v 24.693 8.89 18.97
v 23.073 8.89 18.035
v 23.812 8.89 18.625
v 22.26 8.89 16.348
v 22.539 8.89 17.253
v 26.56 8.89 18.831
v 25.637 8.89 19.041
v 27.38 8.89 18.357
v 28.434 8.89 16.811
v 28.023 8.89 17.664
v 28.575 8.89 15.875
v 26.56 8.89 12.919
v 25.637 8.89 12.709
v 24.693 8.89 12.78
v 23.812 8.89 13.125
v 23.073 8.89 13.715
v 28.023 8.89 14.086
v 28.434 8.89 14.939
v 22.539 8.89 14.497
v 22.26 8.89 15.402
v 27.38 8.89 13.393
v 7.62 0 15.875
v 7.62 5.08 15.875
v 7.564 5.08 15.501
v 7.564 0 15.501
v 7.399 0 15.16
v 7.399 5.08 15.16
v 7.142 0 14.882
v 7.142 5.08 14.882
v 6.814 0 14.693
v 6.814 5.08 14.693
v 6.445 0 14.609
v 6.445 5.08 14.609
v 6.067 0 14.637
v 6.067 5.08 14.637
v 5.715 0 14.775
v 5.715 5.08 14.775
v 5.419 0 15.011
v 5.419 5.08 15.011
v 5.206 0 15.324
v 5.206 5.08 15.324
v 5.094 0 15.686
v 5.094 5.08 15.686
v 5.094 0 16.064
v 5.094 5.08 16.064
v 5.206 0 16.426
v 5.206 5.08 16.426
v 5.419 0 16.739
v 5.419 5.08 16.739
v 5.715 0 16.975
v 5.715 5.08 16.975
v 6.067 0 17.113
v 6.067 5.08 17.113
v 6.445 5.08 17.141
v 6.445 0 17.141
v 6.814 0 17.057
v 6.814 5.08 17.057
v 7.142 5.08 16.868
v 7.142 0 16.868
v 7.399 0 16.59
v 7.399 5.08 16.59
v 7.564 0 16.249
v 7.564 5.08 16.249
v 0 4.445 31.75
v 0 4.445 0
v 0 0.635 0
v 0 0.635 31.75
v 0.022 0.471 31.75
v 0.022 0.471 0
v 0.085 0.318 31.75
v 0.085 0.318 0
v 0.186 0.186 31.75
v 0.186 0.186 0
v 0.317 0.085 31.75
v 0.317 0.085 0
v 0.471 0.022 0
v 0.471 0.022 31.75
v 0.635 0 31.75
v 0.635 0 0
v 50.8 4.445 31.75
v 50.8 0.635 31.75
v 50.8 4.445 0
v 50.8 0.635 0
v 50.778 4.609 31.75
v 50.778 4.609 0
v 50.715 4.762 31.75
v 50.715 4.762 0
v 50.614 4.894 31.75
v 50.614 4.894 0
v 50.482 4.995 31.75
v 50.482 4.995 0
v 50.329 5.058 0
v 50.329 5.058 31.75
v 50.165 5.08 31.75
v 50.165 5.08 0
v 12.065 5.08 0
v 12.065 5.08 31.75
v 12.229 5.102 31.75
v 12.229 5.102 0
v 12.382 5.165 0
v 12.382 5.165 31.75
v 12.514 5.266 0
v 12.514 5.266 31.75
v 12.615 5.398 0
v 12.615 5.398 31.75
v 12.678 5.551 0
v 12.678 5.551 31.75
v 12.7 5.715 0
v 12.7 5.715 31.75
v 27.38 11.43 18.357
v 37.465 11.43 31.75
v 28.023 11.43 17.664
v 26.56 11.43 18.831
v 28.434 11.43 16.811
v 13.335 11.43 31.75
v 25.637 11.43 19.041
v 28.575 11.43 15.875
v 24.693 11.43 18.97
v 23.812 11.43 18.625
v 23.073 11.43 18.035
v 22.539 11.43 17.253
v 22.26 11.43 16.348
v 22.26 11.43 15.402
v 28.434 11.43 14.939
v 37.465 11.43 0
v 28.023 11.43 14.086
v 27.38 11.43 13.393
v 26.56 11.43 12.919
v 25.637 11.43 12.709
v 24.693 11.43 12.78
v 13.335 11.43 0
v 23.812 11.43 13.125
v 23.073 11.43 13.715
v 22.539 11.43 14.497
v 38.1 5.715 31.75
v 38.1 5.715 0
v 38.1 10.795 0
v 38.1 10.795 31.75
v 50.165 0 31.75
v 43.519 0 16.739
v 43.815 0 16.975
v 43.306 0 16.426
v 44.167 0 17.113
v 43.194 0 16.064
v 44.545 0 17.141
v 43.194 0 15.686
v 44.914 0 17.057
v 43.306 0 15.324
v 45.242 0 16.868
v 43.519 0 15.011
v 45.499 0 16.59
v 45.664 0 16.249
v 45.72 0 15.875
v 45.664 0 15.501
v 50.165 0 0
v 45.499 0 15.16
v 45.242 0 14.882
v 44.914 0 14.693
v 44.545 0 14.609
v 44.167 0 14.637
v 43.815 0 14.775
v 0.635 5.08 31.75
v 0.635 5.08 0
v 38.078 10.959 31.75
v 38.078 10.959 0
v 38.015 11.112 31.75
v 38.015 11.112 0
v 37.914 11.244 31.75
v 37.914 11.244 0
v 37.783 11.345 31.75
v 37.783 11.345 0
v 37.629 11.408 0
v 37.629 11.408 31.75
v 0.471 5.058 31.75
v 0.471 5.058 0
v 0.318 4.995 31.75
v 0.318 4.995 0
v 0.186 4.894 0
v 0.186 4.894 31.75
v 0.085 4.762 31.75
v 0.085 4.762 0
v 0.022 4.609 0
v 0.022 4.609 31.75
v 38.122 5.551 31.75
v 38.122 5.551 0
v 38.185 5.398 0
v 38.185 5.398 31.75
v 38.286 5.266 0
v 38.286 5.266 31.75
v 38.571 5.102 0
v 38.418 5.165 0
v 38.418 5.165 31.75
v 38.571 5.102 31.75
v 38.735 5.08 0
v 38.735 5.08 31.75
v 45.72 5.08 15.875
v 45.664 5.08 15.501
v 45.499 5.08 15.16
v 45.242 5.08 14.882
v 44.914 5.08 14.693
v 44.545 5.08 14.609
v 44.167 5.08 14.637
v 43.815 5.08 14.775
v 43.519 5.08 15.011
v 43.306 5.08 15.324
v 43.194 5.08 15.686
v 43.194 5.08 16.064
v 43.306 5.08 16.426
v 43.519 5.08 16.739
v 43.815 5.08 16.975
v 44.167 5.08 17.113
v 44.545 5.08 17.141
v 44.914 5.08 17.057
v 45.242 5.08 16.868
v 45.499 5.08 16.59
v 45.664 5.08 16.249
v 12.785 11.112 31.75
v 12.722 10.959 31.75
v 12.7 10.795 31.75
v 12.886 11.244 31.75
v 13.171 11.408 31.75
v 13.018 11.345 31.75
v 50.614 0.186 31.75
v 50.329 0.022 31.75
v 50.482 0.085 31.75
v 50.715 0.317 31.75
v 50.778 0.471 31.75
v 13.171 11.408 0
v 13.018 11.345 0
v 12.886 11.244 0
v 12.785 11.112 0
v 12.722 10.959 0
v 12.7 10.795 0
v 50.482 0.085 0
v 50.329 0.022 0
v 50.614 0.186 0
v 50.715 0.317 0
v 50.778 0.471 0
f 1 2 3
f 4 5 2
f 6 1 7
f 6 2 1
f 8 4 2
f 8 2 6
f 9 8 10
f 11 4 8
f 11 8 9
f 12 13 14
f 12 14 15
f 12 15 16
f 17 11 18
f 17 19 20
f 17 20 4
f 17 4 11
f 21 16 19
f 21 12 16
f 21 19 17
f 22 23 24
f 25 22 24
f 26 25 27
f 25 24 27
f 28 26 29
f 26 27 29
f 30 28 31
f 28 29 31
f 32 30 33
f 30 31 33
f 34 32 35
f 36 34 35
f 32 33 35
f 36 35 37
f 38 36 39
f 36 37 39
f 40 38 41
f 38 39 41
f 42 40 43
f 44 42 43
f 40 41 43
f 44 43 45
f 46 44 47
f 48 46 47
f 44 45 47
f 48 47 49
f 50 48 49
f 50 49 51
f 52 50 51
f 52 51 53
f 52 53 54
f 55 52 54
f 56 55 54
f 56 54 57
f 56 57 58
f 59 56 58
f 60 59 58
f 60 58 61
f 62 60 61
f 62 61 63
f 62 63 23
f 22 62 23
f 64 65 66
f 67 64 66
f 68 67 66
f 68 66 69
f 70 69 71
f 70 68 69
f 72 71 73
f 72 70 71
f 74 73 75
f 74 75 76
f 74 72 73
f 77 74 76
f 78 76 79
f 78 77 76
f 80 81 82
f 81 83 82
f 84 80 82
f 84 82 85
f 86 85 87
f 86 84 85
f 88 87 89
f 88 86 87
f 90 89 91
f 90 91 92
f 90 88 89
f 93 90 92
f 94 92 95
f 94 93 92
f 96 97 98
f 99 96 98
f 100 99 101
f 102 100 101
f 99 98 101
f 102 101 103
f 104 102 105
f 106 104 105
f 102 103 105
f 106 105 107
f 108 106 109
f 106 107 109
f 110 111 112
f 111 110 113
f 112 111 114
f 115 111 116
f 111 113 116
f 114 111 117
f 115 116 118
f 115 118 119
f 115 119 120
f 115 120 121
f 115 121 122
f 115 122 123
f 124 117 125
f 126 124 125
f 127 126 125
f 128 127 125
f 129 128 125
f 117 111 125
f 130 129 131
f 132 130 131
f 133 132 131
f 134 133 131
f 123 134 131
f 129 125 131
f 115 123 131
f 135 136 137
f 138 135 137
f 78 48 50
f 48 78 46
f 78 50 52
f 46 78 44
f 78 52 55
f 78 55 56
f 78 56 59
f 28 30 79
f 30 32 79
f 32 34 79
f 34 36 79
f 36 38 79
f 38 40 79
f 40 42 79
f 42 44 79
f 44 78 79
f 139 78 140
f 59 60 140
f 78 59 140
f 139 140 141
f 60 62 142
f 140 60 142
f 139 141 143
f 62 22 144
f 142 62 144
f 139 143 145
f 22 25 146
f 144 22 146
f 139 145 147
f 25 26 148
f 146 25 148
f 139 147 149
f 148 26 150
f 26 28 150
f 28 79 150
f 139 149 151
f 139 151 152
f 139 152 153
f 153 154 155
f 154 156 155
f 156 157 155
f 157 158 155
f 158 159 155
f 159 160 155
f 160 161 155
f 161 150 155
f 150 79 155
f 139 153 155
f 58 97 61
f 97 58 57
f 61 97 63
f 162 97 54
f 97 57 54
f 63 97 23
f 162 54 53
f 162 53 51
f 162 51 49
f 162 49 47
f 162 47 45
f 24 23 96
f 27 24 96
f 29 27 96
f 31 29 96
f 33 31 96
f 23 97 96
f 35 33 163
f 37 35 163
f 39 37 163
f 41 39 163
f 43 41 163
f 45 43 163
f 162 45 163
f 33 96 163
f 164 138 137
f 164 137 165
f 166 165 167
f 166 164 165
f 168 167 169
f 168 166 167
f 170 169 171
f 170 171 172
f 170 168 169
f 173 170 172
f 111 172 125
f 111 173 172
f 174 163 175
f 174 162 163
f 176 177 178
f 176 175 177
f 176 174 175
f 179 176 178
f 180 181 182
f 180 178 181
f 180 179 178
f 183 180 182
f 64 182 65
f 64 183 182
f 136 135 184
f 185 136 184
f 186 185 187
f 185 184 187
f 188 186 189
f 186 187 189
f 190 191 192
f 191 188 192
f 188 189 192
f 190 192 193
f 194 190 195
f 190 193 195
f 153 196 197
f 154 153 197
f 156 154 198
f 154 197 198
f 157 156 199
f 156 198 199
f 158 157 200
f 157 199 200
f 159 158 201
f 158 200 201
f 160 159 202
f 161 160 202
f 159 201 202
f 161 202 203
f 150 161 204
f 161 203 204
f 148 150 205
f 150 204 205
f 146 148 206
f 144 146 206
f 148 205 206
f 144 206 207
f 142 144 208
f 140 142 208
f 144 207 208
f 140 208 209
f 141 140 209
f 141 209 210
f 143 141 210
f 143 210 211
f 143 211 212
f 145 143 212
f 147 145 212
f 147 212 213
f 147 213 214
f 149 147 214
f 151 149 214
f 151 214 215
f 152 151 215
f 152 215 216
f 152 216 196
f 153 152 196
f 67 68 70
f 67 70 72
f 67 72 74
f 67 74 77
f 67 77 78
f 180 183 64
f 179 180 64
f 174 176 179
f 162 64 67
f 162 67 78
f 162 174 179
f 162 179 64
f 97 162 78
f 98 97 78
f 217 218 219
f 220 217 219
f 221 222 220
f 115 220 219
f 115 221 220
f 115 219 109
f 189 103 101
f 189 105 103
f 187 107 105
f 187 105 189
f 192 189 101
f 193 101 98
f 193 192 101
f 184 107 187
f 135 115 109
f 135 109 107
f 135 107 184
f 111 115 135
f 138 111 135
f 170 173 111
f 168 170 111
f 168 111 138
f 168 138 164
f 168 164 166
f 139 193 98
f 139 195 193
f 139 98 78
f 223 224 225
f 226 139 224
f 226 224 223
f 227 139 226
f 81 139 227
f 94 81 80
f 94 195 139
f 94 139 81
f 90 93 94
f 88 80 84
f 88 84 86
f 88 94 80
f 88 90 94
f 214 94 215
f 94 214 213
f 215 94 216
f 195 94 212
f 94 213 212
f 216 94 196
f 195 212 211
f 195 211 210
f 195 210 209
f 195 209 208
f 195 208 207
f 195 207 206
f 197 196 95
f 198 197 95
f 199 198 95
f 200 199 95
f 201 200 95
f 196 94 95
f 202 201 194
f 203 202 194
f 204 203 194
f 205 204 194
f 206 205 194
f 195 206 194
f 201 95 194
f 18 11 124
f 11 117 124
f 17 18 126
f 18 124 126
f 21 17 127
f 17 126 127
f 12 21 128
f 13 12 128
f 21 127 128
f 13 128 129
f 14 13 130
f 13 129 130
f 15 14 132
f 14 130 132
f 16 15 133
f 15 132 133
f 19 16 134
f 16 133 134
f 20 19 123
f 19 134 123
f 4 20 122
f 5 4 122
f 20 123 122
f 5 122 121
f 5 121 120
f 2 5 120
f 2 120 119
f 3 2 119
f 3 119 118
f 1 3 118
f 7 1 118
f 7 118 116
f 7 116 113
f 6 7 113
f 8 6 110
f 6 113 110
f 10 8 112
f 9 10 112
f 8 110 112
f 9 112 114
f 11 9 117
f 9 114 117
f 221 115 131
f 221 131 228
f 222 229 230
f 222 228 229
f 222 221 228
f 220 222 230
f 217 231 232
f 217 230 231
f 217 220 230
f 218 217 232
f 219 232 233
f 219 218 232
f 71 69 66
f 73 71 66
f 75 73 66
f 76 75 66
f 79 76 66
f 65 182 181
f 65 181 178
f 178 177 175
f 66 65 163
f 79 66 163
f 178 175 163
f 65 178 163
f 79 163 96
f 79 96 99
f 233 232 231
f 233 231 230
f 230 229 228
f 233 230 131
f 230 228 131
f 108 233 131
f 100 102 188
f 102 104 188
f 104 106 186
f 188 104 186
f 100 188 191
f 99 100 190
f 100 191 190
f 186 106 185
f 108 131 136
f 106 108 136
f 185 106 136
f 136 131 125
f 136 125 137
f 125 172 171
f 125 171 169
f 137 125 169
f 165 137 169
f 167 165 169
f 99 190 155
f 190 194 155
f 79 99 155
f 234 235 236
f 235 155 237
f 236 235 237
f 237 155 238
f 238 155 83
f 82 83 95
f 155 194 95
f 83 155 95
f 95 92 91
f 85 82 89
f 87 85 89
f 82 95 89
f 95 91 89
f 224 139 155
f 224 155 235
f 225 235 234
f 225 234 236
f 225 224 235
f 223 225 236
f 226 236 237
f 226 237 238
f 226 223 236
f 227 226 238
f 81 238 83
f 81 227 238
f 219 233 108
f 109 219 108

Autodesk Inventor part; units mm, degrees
ref_plane "YZ Plane" through (0, 0, 0) normal (1, 0, 0) x (0, 1, 0)
ref_plane "XZ Plane" through (0, 0, 0) normal (0, 1, 0) x (-1, 0, 0)
ref_plane "XY Plane" through (0, 0, 0) normal (0, 0, 1) x (1, 0, 0)
sketch "Sketch1" plane through (0, 0, 0) normal (0, 0, 1) x (1, 0, 0)
  line L0 (0, 0) -> (50.8, 0)
  line L1 (50.8, 0) -> (50.8, 5.08)
  line L2 (50.8, 5.08) -> (0, 5.08)
  line L3 (0, 5.08) -> (0, 0)
  line L4 (12.7, 5.08) -> (38.1, 5.08)
  line L5 (38.1, 5.08) -> (38.1, 11.43)
  line L6 (38.1, 11.43) -> (12.7, 11.43)
  line L7 (12.7, 11.43) -> (12.7, 5.08)
  dimension "d0" = 50.8
  dimension "d1" = 5.08
  dimension "d2" = 25.4
  dimension "d3" = 6.35
  dimension "d4" = 12.7
extrude "Extrusion1" add sketch "Sketch1" along normal blind 31.75
sketch "Sketch3" plane through (12.7, 11.43, 0) normal (0, 1, 0) x (1, 0, 0)
  circle A0 centre (12.7, -15.875) radius 3.175
  line L0 (25.4, 0) -> (0, 0) projected
  line L1 (25.4, 0) -> (25.4, -31.75) projected
  point P0 (-12.7, 0)
  dimension "d8" = 15.875
  dimension "d9" = 12.7
  dimension "d20" = 6.35
extrude "Extrusion2" cut sketch "Sketch3" against normal blind 2.54
sketch "Sketch4" plane through (0, 5.08, 0) normal (0, 1, 0) x (1, 0, 0)
  circle A0 centre (6.35, -15.875) radius 1.27
  circle A1 centre (44.45, -15.875) radius 1.27
  line L0 (50.8, 0) -> (50.8, -31.75) projected
  line L1 (0, 0) -> (0, -31.75) projected
  line L2 (50.8, 0) -> (38.1, 0) projected
  line L3 (12.7, 0) -> (0, 0) projected
  dimension "d12" = 2.54
  dimension "d13" = 2.54
  dimension "d14" = 6.35
  dimension "d15" = 6.35
  dimension "d16" = 15.875
  dimension "d17" = 15.875
extrude "Extrusion3" cut sketch "Sketch4" against normal blind 25.4
fillet "Fillet1" radius 0.635 8 edges at (12.7, 11.43, 15.875) (38.1, 11.43, 15.875) (38.1, 5.08, 15.875) (50.8, 5.08, 15.875) (0, 5.08, 15.875) (50.8, 0, 15.875) (0, 0, 15.875) (12.7, 5.08, 15.875)
equation "\"d12\" = d13"
equation "\"d15\" = d14"
equation "\"d17\" = d16"
properties part number "Base"
